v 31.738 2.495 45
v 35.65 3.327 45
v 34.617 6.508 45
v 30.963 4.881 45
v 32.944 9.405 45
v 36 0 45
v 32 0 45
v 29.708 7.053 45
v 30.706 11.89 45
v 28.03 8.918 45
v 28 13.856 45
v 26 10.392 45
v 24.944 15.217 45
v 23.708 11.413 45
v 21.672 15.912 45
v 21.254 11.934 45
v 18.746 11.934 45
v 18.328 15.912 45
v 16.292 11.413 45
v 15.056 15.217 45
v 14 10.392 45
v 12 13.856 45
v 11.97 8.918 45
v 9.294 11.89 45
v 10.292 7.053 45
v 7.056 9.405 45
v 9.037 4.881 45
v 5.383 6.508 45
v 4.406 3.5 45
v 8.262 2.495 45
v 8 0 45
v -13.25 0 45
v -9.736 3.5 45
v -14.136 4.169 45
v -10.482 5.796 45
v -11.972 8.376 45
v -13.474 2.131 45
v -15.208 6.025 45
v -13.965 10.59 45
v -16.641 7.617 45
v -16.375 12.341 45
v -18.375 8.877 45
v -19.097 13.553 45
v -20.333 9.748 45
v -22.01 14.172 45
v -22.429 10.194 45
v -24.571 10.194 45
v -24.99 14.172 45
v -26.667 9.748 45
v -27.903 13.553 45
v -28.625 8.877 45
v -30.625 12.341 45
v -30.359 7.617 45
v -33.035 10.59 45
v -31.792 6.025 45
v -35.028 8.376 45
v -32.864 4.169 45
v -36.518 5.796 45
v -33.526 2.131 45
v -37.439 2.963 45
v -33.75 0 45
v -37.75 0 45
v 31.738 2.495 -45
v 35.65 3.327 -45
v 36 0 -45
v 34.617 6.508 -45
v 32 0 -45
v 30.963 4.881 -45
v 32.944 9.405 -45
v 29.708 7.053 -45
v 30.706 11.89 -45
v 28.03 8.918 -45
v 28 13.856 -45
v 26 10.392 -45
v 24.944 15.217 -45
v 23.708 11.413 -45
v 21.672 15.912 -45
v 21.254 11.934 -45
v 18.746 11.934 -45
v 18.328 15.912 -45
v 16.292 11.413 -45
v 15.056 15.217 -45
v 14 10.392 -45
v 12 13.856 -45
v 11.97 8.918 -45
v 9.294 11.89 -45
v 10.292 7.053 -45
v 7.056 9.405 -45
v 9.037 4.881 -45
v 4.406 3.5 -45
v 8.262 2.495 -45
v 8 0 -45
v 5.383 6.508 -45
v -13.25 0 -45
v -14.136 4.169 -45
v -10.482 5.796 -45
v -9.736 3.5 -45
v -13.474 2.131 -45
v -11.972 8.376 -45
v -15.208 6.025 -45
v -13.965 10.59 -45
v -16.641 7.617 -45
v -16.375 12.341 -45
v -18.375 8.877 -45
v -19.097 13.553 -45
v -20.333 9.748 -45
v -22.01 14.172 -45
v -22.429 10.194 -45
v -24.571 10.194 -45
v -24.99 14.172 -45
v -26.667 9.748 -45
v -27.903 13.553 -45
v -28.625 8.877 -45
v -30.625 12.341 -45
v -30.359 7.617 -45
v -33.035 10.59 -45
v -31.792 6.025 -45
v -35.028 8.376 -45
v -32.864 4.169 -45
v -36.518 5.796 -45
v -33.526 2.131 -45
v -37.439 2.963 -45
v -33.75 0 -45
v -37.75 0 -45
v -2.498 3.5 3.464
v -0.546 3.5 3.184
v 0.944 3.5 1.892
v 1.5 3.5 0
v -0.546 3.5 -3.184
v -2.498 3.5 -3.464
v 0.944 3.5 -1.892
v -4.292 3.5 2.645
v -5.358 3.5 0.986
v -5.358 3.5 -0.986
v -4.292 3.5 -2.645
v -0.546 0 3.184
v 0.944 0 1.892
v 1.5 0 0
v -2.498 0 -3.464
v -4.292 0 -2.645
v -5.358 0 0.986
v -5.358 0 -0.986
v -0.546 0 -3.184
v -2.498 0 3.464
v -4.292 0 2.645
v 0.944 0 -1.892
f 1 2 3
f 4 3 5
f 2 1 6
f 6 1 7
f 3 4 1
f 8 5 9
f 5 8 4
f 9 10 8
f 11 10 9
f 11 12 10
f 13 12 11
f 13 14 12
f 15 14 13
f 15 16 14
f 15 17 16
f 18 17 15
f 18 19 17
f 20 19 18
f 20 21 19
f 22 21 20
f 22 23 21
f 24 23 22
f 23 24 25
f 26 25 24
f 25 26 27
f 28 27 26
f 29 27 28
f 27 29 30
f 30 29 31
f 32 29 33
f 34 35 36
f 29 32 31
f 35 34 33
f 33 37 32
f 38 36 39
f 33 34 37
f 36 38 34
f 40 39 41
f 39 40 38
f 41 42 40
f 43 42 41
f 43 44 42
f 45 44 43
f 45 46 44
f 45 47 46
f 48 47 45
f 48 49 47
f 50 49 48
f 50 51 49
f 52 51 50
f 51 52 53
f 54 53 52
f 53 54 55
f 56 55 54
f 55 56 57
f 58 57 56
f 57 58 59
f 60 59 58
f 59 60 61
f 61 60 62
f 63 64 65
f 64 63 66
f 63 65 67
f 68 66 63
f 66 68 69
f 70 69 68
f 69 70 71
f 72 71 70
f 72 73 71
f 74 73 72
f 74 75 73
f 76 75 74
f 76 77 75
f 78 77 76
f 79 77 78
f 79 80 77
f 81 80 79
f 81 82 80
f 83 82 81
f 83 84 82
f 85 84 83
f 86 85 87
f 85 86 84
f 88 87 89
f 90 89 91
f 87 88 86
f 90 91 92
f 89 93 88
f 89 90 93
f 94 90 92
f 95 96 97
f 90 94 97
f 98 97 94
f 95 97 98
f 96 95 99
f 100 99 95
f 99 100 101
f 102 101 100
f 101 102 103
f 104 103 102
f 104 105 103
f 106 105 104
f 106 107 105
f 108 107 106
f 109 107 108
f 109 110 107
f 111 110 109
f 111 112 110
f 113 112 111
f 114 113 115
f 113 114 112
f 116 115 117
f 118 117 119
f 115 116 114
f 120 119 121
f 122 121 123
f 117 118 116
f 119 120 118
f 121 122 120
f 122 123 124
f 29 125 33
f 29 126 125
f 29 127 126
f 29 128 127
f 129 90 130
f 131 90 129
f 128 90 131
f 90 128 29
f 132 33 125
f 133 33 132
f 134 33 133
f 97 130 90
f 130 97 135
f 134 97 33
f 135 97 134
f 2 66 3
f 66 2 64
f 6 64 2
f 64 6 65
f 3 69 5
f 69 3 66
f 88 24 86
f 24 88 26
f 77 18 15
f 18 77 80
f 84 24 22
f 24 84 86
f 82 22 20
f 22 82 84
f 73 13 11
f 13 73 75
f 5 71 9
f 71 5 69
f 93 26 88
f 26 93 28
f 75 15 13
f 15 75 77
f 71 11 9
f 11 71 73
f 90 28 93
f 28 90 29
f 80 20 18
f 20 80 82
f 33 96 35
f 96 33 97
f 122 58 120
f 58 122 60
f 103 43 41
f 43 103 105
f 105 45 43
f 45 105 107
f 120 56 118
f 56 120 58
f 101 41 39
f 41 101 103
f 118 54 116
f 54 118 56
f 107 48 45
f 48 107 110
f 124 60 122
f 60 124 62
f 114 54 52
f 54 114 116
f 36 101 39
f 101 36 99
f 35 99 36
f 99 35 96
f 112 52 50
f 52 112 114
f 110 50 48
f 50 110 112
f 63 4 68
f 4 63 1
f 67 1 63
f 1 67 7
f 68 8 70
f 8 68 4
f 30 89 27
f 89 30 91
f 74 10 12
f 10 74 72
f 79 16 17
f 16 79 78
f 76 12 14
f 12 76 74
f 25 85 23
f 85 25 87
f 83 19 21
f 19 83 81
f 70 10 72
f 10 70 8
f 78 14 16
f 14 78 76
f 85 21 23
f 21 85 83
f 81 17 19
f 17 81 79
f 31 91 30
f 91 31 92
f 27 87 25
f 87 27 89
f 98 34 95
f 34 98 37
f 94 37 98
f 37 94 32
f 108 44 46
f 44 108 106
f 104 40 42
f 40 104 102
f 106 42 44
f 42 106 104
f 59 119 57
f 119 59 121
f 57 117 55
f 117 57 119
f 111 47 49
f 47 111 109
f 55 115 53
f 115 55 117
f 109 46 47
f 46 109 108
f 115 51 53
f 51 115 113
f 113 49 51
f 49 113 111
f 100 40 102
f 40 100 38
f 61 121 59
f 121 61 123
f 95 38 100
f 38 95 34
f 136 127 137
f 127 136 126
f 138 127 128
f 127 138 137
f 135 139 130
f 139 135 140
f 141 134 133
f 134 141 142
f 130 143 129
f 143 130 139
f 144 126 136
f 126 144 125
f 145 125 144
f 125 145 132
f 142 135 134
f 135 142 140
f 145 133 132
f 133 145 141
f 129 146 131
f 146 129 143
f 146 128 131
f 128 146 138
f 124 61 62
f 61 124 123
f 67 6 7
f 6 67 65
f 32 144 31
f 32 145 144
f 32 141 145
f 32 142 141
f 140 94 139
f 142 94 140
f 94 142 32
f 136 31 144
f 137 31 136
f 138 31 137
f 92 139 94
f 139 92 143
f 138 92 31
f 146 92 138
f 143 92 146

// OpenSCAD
//Spray extender
module side() {
    difference(){
        union(){
            cube([60,7,90],center=true);
    translate([52-32,0,0]) cylinder(h=90,d=24+8,center=true);
        translate([-
    (52-20.5-8),0,0]) cylinder(h=90,d=20.5+8,center=true);
        }
            translate([52-32,0,0]) cylinder(h=92,d=24,center=true);
             translate([-
    (52-20.5-8),0,0]) cylinder(h=92,d=20.5,center=true);
        translate([-2,0,0]) rotate([90,0,0]) cylinder(h=9,d=7,center=true);
        translate([0,-25,0]) cube([80,50,92],center=true);
        }
}

side();
